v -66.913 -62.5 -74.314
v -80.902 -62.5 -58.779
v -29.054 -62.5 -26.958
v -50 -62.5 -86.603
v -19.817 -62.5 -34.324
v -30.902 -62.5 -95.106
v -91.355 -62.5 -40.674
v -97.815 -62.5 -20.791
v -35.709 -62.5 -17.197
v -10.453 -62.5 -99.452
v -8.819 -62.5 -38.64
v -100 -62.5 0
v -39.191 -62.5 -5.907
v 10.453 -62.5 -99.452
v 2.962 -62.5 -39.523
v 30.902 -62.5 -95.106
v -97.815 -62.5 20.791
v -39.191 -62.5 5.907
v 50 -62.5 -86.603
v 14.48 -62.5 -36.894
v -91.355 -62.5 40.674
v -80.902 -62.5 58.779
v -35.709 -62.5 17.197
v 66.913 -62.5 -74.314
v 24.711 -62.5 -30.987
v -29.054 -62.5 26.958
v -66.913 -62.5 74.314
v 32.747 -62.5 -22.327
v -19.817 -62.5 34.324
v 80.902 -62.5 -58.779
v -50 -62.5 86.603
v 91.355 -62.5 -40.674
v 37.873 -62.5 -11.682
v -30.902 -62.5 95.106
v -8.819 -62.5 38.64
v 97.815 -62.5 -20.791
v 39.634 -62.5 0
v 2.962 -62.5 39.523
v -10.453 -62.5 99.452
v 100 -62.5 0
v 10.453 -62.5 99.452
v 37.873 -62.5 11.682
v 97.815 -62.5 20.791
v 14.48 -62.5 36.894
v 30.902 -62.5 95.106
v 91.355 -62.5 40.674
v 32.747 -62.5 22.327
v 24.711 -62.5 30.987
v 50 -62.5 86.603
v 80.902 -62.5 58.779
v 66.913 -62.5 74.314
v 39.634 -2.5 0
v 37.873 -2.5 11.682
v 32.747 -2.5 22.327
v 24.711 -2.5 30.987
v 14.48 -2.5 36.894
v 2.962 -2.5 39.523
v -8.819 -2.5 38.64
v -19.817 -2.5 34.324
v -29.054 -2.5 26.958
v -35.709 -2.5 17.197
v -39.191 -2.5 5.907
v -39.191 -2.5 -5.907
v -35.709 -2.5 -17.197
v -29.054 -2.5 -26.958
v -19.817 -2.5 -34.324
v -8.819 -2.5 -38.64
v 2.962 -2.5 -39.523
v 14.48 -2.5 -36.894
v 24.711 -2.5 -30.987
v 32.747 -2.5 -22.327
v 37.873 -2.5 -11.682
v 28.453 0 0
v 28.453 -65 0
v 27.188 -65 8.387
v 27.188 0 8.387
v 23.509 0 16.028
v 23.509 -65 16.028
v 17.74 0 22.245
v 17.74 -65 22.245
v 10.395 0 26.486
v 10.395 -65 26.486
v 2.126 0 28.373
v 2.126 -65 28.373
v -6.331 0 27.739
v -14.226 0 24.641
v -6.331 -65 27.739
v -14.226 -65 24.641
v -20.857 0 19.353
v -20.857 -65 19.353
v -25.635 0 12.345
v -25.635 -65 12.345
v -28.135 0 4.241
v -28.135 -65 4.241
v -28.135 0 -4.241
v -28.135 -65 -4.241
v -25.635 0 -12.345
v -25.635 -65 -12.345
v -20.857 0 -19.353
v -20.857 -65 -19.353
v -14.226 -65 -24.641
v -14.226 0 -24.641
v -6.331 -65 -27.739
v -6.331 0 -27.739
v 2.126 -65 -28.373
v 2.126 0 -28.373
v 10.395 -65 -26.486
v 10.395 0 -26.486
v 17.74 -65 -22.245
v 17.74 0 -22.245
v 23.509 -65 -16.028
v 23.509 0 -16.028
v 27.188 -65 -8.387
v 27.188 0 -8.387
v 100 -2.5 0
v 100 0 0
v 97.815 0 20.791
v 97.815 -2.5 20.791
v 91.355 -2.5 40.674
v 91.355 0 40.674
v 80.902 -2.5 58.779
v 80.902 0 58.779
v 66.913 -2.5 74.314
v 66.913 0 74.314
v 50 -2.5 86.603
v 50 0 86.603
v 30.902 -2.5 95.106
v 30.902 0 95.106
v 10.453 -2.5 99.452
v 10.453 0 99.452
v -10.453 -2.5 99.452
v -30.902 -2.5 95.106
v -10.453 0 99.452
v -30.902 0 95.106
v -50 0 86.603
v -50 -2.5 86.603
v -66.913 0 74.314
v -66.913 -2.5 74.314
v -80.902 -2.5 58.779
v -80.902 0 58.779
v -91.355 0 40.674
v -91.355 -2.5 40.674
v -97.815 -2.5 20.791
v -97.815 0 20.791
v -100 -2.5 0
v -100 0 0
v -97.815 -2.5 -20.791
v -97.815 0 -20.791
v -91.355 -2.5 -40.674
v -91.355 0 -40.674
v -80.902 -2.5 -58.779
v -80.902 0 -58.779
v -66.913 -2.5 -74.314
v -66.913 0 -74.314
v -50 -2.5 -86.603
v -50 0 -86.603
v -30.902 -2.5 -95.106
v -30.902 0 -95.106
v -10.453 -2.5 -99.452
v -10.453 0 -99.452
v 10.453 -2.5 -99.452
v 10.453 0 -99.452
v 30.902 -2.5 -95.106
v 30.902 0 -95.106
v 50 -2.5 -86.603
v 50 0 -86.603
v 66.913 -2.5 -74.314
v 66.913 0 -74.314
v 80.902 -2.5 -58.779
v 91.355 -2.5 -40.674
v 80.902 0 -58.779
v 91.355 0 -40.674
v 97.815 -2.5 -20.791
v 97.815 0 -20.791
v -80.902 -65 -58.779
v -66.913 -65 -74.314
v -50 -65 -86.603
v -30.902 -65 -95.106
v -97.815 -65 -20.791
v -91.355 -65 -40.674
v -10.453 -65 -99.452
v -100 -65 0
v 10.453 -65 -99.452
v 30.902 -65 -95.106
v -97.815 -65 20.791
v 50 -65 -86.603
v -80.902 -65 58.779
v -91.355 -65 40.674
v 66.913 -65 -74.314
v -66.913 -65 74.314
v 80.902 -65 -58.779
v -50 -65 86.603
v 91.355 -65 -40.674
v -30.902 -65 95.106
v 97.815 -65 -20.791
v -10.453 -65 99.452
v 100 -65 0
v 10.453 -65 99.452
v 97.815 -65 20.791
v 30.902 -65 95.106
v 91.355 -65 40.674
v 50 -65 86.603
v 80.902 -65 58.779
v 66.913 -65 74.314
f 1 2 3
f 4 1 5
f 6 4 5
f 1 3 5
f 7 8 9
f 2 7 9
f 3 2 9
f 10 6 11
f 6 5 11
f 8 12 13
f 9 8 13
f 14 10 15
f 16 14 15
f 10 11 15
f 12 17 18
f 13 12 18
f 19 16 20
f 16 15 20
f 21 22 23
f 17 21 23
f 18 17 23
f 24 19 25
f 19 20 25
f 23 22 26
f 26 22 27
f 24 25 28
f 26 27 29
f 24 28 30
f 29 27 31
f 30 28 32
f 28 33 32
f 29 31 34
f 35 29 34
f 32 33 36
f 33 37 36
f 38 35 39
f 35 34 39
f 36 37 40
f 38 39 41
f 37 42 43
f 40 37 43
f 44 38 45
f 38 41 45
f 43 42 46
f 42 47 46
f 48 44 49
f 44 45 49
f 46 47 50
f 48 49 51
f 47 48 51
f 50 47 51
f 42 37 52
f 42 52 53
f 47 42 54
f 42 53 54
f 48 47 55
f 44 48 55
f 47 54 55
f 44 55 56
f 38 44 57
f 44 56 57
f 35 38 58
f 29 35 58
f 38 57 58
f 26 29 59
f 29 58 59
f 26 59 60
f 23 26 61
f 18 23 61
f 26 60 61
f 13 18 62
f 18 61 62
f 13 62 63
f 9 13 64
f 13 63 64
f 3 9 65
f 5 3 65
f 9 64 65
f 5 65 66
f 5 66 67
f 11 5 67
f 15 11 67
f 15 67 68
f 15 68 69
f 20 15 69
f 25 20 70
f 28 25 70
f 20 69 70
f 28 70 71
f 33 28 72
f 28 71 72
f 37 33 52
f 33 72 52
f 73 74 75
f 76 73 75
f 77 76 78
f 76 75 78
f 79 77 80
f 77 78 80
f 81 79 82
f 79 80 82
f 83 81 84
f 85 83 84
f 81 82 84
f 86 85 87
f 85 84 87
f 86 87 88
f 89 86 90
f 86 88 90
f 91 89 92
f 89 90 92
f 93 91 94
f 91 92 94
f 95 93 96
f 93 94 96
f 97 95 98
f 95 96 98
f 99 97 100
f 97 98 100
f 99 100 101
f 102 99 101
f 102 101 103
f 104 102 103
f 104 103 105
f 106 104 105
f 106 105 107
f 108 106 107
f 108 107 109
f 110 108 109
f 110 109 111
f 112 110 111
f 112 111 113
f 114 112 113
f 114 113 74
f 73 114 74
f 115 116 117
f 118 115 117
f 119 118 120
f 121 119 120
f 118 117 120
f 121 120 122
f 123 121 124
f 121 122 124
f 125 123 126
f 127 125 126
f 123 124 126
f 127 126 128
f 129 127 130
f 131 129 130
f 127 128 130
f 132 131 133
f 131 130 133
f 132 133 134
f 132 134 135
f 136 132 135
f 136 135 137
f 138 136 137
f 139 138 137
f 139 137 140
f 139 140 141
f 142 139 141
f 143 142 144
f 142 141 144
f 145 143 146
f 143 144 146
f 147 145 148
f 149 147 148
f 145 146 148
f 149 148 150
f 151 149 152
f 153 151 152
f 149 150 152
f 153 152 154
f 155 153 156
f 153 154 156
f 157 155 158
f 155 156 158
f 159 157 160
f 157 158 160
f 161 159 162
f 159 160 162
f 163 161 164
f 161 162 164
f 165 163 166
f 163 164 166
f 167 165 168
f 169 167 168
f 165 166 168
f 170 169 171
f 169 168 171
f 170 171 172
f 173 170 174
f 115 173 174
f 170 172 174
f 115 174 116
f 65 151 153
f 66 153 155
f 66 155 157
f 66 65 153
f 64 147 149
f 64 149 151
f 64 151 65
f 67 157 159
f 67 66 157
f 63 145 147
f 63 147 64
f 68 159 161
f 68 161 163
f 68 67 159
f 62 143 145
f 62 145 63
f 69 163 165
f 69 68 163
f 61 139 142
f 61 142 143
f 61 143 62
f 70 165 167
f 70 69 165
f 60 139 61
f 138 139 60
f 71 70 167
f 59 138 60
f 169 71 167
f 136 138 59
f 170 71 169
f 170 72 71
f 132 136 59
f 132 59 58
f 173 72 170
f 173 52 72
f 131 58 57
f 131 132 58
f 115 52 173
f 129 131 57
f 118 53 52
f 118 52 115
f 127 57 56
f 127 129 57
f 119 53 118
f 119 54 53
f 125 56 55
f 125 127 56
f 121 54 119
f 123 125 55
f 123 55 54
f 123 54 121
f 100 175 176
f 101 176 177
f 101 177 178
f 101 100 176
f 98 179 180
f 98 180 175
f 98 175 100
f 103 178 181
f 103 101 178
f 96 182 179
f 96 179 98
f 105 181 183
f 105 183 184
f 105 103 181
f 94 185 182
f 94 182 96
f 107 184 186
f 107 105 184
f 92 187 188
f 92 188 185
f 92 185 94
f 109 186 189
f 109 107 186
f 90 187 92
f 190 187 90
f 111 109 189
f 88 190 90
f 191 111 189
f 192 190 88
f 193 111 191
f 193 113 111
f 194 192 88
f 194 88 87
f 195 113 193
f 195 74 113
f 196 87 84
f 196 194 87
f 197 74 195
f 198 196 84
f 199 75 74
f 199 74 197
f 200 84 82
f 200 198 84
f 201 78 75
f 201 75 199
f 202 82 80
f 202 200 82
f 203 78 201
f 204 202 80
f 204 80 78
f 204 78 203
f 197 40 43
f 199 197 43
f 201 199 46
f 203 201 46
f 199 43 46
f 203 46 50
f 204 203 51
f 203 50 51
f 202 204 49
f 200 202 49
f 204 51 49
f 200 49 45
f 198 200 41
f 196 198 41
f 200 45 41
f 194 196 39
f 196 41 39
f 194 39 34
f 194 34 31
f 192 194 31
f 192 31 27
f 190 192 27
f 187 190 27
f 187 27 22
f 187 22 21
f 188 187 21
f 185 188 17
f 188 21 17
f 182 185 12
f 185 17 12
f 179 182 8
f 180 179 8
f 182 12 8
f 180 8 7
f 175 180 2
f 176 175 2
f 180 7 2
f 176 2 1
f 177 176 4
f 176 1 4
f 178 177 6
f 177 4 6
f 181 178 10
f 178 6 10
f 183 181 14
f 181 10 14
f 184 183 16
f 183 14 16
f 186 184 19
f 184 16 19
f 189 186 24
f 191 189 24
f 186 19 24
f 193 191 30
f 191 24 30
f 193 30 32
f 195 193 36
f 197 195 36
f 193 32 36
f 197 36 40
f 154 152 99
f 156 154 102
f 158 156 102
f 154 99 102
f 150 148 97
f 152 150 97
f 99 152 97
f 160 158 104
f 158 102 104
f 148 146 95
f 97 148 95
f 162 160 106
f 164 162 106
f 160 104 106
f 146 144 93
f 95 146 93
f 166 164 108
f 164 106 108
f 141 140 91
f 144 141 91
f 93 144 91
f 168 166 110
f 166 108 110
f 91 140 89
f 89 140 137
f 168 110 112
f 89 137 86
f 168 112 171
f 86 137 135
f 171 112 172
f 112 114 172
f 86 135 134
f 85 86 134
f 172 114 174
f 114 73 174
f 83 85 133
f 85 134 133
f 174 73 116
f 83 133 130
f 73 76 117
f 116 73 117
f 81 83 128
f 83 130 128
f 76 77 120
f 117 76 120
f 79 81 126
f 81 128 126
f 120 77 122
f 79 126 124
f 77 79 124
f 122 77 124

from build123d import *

# Parameters (mm, degrees)
SKETCH_R     = 100
PAD_DEPTH    = 2.5
SKETCH001_R  = 39.634074
PAD001_DEPTH = 60
SKETCH002_R  = 100
PAD002_DEPTH = 2.5
SKETCH003_R  = 28.45255
POCKET_DEPTH = 65.001


with BuildPart() as part:
    # Sketch → Pad (new body)
    with BuildSketch(Plane.XZ):
        Circle(SKETCH_R)
    extrude(amount=PAD_DEPTH)

    # Sketch001 → Pad001 (new body)
    with BuildSketch(Plane.XZ.offset(2.5)):
        Circle(SKETCH001_R)
    extrude(amount=PAD001_DEPTH)

    # Sketch002 → Pad002 (new body)
    with BuildSketch(Plane.XZ.offset(62.5)):
        Circle(SKETCH002_R)
    extrude(amount=PAD002_DEPTH)

    # Sketch003 → Pocket (cut, through all)
    with BuildSketch(Plane.XZ.offset(65)):
        Circle(SKETCH003_R)
    extrude(amount=-POCKET_DEPTH, mode=Mode.SUBTRACT)


solid = part.part
